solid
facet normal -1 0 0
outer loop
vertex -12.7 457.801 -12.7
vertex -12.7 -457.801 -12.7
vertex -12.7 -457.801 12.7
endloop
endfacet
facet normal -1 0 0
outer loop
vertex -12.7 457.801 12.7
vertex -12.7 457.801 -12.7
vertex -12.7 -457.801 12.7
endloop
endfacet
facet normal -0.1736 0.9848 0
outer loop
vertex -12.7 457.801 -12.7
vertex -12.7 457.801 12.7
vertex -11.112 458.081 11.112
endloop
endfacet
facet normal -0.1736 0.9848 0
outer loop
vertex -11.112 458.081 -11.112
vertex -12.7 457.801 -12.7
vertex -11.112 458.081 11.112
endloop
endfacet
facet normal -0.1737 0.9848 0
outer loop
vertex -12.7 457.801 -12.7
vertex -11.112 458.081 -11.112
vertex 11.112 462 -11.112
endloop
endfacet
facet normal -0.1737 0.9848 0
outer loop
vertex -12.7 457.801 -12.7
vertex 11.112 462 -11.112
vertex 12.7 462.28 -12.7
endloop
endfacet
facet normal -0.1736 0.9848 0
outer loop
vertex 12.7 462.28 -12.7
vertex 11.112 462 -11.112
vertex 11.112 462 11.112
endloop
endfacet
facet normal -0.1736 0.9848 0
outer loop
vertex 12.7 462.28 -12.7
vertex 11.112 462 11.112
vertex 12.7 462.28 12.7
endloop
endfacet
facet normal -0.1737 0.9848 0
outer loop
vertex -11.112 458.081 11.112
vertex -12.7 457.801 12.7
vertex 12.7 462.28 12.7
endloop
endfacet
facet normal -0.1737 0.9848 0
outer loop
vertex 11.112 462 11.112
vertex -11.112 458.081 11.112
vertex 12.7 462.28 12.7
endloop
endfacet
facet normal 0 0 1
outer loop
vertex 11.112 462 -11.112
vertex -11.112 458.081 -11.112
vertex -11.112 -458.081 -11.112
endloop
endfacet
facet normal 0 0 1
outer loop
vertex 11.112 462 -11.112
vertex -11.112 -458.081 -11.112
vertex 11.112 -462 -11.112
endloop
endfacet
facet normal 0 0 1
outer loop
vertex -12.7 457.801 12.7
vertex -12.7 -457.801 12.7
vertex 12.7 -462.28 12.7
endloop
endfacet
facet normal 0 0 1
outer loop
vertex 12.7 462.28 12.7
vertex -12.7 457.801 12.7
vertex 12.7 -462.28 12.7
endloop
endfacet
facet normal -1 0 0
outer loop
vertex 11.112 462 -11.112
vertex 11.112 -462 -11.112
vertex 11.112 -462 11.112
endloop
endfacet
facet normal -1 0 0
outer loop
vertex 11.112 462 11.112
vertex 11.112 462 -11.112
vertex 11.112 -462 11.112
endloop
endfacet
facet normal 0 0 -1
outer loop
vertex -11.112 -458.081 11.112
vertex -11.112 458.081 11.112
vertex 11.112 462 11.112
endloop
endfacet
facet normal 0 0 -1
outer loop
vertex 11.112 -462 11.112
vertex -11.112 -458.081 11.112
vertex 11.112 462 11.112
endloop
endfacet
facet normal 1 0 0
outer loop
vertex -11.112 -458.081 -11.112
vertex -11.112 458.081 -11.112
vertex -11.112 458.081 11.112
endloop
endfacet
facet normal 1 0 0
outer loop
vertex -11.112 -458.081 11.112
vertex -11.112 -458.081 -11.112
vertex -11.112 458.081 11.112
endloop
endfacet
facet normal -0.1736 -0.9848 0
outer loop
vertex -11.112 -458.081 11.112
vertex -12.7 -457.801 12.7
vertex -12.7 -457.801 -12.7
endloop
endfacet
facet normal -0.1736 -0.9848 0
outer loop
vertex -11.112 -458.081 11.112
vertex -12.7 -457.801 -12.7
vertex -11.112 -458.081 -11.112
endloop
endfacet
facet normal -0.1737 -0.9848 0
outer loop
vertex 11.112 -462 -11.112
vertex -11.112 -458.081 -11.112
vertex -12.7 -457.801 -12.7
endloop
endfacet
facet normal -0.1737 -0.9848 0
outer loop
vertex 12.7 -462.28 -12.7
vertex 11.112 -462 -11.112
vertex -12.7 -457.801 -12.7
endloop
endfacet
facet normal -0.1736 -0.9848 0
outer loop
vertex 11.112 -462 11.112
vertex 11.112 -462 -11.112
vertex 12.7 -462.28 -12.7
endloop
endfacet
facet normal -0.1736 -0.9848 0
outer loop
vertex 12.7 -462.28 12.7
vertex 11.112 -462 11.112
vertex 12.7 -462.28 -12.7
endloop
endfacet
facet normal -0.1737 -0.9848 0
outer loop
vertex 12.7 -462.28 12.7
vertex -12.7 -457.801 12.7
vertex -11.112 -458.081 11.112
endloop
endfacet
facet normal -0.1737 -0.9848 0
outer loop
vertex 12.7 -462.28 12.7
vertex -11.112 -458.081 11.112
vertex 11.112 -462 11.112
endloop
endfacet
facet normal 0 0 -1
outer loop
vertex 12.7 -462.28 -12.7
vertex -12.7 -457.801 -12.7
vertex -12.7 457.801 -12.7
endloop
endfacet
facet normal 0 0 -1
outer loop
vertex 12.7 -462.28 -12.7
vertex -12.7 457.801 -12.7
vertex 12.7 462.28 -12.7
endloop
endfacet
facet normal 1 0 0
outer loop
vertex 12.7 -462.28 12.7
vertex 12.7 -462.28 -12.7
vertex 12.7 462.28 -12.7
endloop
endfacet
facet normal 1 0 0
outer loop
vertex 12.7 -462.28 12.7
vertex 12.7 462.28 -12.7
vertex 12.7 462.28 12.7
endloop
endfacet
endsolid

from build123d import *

# Parameters (mm, degrees)
F0_W     = 25.4
F0_H     = 25.4
F0_W_2   = 22.225
F0_H_2   = 22.225
F1_DEPTH = 462.28
F3_DEPTH = 25.401


# Not quite as in the source:
# - a pattern or mirror of a feature is missing from the dataset's text; its kind, count and spacing are read off the source's solid


with BuildPart() as f1:
    # F0 (on Front) → F1 (new body, symmetric)
    with BuildSketch(Plane.XZ):
        Rectangle(F0_W, F0_H)
        Rectangle(F0_W_2, F0_H_2, mode=Mode.SUBTRACT)
    extrude(amount=F1_DEPTH, both=True)

    # F2 (on face) → F3 (cut, through all)
    with BuildSketch(Plane.XY.offset(12.7)):
        Polygon((12.7, 462.28), (-12.7, 462.28), (-12.7, 457.80129469), align=None)
    f3 = extrude(amount=-F3_DEPTH, mode=Mode.SUBTRACT)

    # F3_copies: F3 across plane
    add(f3.mirror(Plane(origin=(0, 0, 0), x_dir=(0, 0, -1), z_dir=(0, -1, 0))), mode=Mode.SUBTRACT)


solid = f1.part
